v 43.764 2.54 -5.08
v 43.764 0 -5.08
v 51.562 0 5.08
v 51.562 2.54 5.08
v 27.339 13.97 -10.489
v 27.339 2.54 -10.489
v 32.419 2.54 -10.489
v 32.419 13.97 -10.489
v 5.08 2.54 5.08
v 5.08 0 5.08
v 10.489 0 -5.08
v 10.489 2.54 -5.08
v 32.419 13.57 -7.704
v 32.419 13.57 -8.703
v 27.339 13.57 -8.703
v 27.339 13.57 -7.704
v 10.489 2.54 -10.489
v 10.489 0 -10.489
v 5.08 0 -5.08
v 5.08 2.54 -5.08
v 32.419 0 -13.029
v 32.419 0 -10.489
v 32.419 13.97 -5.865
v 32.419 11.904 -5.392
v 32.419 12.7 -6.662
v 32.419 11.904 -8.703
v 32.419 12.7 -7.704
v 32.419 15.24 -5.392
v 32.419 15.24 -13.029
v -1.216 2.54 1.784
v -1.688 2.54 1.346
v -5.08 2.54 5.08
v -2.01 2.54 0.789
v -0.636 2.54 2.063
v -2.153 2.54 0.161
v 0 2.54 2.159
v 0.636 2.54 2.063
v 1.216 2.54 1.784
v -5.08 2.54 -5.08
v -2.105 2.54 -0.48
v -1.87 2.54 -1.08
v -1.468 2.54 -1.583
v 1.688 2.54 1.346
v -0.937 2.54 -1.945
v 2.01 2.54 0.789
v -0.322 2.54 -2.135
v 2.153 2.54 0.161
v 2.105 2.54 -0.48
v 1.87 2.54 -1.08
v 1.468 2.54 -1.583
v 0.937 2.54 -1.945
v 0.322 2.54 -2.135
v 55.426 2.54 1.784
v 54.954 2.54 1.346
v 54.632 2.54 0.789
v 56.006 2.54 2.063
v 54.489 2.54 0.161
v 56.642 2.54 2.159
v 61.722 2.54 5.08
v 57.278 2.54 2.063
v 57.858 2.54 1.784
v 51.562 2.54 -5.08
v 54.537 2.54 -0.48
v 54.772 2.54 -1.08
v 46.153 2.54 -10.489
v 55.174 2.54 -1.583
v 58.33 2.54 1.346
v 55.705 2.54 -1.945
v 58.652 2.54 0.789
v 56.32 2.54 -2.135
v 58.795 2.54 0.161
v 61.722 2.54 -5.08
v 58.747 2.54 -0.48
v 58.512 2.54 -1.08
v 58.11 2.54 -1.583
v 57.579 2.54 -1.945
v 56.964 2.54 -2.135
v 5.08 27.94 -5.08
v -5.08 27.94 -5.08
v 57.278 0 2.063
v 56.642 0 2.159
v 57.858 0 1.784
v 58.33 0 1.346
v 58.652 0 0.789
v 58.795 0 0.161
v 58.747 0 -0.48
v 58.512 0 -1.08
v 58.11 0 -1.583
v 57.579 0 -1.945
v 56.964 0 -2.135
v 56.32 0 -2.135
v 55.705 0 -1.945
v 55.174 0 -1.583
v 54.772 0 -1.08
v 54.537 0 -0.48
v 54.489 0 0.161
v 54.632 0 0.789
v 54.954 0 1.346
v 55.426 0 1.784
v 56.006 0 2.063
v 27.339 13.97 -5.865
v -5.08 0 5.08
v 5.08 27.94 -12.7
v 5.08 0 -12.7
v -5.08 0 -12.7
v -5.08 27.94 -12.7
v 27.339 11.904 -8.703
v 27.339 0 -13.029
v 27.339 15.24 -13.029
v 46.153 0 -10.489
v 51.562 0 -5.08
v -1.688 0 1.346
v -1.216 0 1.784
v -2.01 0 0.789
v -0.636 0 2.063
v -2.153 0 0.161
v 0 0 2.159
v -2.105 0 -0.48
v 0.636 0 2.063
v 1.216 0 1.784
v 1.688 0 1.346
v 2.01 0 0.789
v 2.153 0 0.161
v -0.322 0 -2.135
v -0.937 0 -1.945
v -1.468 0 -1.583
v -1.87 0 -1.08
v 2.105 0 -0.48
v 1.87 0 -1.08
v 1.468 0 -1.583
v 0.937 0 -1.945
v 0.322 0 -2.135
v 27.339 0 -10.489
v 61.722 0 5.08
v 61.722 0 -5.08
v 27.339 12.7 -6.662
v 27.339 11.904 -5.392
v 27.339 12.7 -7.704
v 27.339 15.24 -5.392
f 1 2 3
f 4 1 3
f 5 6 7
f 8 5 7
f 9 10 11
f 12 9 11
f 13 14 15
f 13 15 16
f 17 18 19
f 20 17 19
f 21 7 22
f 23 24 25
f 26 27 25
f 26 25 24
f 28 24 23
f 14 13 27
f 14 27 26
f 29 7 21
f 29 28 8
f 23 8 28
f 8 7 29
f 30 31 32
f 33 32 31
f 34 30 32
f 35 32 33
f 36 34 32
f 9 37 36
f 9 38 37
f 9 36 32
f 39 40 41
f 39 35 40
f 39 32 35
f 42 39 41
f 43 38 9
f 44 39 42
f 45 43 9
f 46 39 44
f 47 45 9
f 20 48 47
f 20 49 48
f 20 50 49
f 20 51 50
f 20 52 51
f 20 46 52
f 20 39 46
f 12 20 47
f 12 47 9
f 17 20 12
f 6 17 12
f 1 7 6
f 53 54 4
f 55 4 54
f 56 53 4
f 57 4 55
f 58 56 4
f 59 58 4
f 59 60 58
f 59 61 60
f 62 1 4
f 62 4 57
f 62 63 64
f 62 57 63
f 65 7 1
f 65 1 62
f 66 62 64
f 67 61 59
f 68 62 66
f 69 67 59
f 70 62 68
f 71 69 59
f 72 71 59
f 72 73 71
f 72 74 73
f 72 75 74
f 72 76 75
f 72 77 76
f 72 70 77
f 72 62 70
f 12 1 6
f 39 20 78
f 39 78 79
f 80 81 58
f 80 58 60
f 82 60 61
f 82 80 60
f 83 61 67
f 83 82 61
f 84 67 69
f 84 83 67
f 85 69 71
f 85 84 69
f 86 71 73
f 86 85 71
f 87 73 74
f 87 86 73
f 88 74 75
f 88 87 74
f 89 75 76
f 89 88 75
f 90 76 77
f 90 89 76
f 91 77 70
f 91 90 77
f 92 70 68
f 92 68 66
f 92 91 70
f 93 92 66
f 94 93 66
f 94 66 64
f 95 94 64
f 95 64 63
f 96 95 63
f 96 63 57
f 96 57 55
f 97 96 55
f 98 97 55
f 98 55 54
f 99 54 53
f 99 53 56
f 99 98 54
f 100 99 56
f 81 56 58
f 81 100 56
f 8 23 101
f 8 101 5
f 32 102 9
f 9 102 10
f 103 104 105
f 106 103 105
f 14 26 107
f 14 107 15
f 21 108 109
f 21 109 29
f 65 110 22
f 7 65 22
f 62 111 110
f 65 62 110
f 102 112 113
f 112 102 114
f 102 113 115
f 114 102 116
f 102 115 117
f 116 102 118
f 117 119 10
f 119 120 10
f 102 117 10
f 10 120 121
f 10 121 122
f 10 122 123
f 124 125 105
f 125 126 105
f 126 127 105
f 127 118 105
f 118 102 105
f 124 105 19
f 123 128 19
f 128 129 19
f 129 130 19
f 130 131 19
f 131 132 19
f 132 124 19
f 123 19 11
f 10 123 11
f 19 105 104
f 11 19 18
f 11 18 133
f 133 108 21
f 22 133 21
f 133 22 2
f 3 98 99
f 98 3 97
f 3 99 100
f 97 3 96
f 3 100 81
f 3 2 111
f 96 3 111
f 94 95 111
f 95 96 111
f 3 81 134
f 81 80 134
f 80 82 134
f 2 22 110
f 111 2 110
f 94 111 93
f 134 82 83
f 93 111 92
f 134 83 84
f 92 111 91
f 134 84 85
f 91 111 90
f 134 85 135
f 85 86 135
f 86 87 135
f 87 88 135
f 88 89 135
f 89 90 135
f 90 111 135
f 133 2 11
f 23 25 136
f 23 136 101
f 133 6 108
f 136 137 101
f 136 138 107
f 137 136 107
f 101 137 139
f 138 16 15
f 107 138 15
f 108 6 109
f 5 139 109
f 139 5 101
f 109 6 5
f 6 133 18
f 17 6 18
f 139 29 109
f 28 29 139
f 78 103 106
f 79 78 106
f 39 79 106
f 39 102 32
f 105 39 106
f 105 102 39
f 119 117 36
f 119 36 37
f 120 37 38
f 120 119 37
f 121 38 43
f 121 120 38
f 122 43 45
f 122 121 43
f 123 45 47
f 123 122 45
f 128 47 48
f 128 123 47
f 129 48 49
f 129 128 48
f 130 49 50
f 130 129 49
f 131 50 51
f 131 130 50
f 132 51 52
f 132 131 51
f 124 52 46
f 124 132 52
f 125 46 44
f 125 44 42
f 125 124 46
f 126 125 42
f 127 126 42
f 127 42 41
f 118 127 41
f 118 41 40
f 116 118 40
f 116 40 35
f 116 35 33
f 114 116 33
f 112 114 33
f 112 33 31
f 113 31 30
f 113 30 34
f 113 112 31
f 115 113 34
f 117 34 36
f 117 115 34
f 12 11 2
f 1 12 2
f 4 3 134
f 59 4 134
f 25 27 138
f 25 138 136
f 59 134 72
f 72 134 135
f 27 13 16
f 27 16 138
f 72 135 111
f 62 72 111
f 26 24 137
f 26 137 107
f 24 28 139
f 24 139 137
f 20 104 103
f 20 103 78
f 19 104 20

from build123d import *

# Parameters (mm, degrees)
SKETCH1_R                = 2.159
BOSS_EXTRUDE2_DEPTH      = 2.54
BOSS_EXTRUDE5_DEPTH      = 25.4
BOSS_EXTRUDE5_DEPTH_BACK = 2.54
BOSS_EXTRUDE8_DEPTH      = 12.7
BOSS_EXTRUDE8_DEPTH_BACK = 2.54
SKETCH4_W                = 5.08
SKETCH4_H                = 2.54
BOSS_EXTRUDE9_DEPTH      = 5.08


with BuildPart() as part:
    # Sketch1 → Boss-Extrude2 (new body)
    with BuildSketch(Plane(origin=(0, 0, 0), x_dir=(1, 0, 0), z_dir=(0, 1, 0))):
        Polygon((0, -5.08), (5.08, -5.08), (10.489221848, 5.08), (43.764184298, 5.08), (51.562, -5.08), (61.722, -5.08), (61.722, 5.08), (56.642, 5.08), (51.562, 5.08), (46.152778152, 10.489221848), (10.489221848, 10.489221848), (5.08, 5.08), (-5.08, 5.08), (-5.08, -5.08), align=None)
        Circle(SKETCH1_R, mode=Mode.SUBTRACT)
        with Locations((56.642, 0)):
            Circle(SKETCH1_R, mode=Mode.SUBTRACT)
    extrude(amount=BOSS_EXTRUDE2_DEPTH)

    # Sketch3 → Boss-Extrude5 (add, two sides: drawn at the far end of the back side and taken through both)
    with BuildSketch(Plane(origin=(0, 2.54, 0), x_dir=(1, 0, 0), z_dir=(0, 1, 0)).offset(-BOSS_EXTRUDE5_DEPTH_BACK)):
        Polygon((-5.08, 5.08), (5.08, 5.08), (5.08, 12.7), (0, 12.7), (-5.08, 12.7), align=None)
    extrude(amount=BOSS_EXTRUDE5_DEPTH + BOSS_EXTRUDE5_DEPTH_BACK)

    # Sketch4 → Boss-Extrude8 (add, two sides: drawn at the far end of the back side and taken through both)
    with BuildSketch(Plane(origin=(0, 2.54, 0), x_dir=(1, 0, 0), z_dir=(0, 1, 0)).offset(-BOSS_EXTRUDE8_DEPTH_BACK)):
        with Locations((29.878652905, 11.759221848)):
            Rectangle(SKETCH4_W, SKETCH4_H)
    extrude(amount=BOSS_EXTRUDE8_DEPTH + BOSS_EXTRUDE8_DEPTH_BACK)

    # Sketch7 → Boss-Extrude9 (add)
    with BuildSketch(Plane(origin=(32.418652905, 0, 0), x_dir=(0, 0, -1), z_dir=(1, 0, 0))):
        Polygon((10.489221848, 15.24), (5.391589044, 15.24), (5.391589044, 12.7), (5.391589044, 11.903510412), (7.271896049, 11.903510412), (8.703373283, 11.903510412), (8.703373283, 13.570272135), (7.703807283, 13.570272135), (7.703807283, 12.7), (7.271896049, 12.7), (6.661589044, 12.7), (5.865099456, 13.97), (6.661589044, 13.97), (10.489221848, 13.97), align=None)
    extrude(amount=-BOSS_EXTRUDE9_DEPTH)


solid = part.part
